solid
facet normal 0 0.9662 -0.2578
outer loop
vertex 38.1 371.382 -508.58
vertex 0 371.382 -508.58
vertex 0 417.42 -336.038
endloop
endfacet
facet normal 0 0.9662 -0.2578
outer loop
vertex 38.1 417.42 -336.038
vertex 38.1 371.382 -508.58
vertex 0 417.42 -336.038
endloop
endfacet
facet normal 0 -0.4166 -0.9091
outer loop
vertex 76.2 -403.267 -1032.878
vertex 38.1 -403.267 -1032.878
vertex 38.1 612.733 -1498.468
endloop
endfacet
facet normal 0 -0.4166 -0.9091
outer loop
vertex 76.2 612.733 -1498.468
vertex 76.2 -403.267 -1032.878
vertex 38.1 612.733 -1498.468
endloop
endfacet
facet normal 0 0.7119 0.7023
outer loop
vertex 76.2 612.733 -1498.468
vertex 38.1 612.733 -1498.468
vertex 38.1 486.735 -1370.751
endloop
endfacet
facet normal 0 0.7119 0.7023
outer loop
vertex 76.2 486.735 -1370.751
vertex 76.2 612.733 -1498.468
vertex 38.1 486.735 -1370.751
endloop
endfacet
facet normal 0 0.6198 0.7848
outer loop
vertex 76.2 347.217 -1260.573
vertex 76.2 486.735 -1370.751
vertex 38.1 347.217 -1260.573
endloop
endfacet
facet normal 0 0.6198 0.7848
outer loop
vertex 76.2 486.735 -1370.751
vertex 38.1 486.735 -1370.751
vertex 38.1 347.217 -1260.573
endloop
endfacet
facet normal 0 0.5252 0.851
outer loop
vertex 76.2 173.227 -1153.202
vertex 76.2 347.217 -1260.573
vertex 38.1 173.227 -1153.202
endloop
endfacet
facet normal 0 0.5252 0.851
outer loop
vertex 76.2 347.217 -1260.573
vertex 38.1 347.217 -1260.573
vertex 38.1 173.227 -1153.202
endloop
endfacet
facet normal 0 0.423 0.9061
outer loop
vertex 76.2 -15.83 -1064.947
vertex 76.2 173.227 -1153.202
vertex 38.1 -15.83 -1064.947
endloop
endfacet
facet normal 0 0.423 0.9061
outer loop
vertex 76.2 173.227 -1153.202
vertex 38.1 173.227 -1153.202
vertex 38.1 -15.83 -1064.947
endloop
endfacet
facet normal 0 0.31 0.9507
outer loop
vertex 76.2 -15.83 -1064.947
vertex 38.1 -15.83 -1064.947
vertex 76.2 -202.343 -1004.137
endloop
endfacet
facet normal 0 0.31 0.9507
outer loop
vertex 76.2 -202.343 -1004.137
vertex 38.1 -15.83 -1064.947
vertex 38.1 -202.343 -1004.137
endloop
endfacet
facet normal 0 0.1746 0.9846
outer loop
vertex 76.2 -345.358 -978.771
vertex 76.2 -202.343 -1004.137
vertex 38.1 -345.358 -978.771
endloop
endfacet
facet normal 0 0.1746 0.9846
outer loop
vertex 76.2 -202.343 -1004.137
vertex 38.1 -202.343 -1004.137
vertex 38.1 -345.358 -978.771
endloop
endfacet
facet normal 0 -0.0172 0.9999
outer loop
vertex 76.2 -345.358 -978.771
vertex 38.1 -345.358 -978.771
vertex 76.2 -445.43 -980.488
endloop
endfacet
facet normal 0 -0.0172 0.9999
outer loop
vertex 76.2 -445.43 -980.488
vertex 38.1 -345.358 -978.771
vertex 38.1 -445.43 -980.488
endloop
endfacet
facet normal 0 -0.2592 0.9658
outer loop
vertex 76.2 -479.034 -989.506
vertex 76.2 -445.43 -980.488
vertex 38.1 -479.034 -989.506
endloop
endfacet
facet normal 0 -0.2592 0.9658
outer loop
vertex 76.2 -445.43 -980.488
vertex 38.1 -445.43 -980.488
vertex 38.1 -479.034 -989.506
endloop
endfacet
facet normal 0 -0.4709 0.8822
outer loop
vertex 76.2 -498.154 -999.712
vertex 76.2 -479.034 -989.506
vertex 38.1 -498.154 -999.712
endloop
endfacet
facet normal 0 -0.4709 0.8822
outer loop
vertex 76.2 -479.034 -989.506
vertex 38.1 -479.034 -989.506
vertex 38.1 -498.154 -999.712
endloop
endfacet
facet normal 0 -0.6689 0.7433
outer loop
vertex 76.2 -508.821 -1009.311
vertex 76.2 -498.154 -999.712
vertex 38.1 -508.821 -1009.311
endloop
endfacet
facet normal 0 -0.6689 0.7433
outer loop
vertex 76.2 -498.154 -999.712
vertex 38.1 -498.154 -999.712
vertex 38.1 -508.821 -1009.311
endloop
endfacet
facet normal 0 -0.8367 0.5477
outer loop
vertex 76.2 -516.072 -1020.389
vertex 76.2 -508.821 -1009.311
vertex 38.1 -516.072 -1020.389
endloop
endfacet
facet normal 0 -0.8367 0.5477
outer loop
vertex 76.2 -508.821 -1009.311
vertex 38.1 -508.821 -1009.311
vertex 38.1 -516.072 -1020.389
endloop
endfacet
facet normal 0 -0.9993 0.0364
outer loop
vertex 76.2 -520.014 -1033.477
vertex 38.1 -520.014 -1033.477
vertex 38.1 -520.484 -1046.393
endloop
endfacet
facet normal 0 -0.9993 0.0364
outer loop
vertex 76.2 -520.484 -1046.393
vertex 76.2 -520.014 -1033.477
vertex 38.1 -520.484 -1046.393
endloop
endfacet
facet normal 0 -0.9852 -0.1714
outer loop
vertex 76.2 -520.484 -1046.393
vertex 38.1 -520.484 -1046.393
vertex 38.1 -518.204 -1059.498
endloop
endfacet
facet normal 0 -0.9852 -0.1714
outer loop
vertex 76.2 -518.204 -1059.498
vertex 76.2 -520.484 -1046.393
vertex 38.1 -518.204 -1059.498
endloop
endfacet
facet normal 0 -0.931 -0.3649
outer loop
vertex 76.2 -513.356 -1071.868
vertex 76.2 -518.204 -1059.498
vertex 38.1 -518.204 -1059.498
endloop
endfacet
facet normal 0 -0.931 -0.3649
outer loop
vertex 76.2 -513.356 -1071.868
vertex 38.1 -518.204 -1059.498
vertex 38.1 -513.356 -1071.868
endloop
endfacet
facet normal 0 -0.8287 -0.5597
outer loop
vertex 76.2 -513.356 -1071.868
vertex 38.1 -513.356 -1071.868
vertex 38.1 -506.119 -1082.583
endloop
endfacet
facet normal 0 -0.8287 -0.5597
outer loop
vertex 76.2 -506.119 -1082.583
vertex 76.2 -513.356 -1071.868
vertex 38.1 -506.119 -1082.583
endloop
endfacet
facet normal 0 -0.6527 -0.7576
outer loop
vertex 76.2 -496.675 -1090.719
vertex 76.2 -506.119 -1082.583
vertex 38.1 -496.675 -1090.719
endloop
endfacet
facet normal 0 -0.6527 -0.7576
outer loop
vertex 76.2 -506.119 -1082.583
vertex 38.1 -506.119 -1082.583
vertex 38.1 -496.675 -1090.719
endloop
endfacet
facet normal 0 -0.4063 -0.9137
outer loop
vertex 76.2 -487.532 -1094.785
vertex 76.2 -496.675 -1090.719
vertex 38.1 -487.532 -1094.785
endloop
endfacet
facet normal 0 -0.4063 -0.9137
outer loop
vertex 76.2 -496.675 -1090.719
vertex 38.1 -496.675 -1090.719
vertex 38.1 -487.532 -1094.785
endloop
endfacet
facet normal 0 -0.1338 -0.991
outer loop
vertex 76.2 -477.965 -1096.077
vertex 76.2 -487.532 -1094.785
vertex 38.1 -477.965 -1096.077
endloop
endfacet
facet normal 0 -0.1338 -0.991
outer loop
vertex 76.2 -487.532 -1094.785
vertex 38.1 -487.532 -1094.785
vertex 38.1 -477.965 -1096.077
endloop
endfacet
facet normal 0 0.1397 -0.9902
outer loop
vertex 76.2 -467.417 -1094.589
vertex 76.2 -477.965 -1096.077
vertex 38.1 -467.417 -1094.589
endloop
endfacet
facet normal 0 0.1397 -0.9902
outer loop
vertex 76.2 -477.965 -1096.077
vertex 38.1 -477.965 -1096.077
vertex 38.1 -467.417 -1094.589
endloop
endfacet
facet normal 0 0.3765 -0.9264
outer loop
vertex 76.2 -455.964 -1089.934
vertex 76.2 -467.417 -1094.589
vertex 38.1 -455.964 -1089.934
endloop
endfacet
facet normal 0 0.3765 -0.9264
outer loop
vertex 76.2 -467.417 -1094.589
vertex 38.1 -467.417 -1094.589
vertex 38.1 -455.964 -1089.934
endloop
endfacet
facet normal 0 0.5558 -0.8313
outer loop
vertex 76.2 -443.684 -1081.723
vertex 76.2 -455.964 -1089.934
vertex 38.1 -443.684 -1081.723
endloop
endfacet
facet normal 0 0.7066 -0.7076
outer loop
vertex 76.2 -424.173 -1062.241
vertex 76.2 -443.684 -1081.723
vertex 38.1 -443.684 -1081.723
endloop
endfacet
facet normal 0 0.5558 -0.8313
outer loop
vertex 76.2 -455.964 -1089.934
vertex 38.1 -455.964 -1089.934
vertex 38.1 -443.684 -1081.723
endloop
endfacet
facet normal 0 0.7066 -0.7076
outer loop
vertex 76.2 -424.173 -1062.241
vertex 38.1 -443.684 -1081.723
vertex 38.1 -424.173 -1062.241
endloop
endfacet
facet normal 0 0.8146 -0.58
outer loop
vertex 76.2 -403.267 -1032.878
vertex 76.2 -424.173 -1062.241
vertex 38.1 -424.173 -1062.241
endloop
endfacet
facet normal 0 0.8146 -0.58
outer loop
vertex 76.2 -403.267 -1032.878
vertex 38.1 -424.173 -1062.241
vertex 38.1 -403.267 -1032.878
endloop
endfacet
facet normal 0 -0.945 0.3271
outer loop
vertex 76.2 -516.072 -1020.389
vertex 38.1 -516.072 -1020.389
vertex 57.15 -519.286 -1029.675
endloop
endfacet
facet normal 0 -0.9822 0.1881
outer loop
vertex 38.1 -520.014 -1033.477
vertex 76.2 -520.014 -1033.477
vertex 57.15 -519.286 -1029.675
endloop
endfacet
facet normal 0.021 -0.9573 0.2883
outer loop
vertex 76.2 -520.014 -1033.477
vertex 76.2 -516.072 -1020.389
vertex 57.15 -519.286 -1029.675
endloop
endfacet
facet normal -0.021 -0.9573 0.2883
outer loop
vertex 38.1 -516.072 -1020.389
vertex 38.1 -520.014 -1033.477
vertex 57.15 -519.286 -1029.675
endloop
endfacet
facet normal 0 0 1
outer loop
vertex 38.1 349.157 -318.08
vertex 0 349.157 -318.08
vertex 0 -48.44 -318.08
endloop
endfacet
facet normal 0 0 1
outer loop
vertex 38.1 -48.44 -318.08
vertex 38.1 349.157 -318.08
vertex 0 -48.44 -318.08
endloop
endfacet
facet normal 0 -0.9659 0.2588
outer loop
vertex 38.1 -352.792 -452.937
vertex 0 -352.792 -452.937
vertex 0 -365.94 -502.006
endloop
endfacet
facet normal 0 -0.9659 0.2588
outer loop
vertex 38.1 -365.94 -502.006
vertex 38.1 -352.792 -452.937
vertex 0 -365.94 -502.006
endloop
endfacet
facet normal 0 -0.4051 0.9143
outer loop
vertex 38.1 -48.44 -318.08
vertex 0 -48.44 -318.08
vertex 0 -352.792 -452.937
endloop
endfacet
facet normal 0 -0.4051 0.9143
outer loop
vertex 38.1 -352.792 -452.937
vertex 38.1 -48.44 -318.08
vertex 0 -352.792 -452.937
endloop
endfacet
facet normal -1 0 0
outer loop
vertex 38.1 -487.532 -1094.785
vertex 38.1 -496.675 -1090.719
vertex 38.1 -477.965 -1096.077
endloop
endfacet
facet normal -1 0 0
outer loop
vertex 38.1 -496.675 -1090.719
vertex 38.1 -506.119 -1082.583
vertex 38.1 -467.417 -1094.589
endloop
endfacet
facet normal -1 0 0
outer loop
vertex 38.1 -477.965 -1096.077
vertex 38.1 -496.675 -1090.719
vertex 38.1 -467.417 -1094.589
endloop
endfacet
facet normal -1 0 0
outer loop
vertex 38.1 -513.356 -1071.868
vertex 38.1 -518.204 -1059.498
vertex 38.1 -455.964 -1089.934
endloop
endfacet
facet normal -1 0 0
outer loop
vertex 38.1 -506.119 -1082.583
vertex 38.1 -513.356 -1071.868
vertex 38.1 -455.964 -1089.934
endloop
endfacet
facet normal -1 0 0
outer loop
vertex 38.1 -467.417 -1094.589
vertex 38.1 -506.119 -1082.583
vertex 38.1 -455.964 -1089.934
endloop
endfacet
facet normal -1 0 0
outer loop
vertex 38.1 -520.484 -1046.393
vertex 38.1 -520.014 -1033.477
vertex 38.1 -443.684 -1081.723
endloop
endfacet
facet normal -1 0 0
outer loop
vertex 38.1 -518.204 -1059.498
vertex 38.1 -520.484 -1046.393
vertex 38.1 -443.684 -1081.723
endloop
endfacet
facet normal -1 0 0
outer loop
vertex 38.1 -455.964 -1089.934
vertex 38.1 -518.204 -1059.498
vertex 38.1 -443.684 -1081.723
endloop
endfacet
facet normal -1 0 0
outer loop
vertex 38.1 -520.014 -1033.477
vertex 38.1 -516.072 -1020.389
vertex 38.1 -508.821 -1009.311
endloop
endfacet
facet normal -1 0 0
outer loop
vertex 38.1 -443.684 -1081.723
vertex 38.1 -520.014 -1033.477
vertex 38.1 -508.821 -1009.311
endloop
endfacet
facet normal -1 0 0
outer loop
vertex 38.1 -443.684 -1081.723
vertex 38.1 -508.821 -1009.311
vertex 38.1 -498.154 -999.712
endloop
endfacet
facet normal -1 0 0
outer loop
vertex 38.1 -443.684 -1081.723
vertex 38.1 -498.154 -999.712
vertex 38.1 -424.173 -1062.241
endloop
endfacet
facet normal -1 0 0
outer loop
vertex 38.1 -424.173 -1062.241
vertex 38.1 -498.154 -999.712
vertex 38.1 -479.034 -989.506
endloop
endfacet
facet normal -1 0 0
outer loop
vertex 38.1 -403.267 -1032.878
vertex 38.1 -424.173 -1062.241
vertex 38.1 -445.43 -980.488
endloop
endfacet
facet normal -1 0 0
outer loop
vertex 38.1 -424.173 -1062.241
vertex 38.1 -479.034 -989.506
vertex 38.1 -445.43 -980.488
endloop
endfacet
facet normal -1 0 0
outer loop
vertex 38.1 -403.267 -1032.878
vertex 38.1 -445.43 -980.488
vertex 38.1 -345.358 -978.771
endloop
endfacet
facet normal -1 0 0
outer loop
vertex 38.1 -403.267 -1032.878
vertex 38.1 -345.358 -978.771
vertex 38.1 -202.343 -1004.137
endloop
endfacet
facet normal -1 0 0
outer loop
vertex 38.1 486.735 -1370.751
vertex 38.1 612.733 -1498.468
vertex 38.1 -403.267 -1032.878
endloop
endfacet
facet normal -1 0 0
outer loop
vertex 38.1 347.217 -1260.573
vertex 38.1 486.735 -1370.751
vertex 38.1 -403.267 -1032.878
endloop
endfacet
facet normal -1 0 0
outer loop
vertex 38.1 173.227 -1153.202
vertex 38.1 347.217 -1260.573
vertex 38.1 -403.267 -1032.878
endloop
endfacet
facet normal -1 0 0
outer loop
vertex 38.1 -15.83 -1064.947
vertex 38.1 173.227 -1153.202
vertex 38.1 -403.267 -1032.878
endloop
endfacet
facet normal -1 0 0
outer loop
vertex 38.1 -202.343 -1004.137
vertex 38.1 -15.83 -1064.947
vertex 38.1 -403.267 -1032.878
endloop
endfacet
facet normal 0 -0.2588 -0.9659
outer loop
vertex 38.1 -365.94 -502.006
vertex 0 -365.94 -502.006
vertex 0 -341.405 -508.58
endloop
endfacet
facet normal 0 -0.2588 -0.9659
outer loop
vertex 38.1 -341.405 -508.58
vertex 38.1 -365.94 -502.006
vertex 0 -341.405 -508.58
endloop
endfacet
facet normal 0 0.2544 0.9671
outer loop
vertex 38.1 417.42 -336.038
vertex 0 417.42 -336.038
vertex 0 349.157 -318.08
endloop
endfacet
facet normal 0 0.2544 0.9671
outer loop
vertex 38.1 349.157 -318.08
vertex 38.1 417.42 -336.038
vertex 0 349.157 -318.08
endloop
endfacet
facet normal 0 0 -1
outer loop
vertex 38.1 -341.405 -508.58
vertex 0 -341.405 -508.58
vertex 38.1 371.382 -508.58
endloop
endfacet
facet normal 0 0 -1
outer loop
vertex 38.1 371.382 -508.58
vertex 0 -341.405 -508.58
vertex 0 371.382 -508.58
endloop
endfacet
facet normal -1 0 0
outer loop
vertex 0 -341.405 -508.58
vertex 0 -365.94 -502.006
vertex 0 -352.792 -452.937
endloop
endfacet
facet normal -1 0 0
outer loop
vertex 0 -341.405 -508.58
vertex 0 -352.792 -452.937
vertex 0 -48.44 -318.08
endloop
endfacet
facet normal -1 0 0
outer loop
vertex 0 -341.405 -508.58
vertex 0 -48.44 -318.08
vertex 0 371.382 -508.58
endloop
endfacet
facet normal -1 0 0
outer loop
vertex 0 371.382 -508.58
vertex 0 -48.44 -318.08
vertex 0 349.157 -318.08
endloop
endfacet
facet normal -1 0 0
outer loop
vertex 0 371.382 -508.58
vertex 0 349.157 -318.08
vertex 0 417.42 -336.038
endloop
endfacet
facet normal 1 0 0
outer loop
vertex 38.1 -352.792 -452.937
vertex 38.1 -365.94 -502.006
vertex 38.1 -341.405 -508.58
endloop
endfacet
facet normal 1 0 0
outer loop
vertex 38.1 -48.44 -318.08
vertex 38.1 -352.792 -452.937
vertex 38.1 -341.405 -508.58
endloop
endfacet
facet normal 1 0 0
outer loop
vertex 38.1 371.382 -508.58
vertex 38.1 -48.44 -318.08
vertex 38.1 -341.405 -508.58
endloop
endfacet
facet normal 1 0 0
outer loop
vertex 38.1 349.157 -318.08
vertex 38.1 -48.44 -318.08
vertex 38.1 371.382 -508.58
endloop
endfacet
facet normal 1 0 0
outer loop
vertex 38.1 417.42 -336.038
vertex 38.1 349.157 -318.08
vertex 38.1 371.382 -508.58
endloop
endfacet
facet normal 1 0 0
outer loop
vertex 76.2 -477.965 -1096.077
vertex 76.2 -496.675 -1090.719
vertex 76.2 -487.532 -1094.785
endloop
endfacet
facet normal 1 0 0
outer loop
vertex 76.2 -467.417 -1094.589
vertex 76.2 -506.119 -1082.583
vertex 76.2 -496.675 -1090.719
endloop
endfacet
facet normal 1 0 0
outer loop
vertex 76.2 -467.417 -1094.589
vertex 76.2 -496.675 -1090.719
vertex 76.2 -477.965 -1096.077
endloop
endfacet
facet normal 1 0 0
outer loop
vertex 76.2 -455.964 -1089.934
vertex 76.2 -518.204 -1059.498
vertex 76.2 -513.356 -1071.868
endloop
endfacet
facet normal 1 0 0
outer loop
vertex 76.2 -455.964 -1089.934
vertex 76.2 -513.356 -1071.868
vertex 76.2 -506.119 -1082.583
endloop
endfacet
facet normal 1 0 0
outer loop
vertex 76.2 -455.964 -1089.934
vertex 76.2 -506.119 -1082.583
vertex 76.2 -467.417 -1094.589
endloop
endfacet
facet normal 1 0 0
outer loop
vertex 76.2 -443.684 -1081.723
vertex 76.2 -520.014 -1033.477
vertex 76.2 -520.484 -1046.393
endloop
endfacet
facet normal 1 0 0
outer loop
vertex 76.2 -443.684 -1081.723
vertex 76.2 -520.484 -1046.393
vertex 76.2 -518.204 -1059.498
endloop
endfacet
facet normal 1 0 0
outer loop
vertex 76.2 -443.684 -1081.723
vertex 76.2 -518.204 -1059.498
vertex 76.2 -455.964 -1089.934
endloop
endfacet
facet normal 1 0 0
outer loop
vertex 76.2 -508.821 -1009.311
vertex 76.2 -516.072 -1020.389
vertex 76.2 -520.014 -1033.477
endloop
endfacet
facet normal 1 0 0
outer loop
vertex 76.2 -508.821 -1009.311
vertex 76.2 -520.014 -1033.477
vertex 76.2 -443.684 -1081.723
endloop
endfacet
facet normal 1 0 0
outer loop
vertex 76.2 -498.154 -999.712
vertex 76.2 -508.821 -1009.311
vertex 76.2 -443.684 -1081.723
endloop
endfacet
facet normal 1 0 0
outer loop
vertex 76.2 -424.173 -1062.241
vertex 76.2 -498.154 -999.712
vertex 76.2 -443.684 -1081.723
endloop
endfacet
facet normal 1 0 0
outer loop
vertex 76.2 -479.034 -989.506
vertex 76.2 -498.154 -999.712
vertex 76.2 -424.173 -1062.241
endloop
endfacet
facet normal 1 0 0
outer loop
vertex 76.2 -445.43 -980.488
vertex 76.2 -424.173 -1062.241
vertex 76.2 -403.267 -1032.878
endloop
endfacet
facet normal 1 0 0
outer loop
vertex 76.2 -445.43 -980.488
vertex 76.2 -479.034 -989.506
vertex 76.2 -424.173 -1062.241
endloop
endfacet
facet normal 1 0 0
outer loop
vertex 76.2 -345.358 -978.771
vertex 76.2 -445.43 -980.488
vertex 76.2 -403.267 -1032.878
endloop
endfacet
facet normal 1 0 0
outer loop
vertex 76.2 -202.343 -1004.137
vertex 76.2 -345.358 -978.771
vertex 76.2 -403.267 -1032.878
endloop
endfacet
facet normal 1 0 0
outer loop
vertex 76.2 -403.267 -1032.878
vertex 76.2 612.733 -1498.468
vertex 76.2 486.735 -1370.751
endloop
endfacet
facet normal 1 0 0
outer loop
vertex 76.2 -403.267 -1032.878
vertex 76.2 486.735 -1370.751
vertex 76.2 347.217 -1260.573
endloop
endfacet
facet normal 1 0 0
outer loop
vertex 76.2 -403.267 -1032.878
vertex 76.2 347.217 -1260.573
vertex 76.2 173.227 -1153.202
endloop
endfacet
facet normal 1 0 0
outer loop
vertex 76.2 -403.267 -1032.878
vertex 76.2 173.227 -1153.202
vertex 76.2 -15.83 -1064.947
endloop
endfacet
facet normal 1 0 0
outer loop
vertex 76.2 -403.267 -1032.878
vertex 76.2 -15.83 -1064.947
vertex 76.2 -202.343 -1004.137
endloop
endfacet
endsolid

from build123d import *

# Parameters (mm, degrees)
F1_DEPTH = 38.1
F4_DEPTH = 38.1


with BuildPart() as f1:
    # F0 (on Right) → F1 (new body)
    with BuildSketch(Plane.YZ):
        Polygon((-365.9396546841, -502.0062856797), (-341.4051386963, -508.5802894253), (371.3823613037, -508.5802894253), (417.4198613037, -336.0380894253), (349.1573613037, -318.0802894253), (-48.4396546841, -318.0802894253), (-352.7916471929, -452.9372537042), align=None)
    extrude(amount=F1_DEPTH)


with BuildPart() as f4:
    # F3 (on face) → F4 (new body)
    with BuildSketch(Plane.YZ.offset(38.1)):
        with BuildLine():
            Line((-403.2669318563, -1032.8784938841), (612.7330681437, -1498.4681844916))
            add(Edge.make_bspline(
                [(612.7330681437, -1498.4681844916), (225.1875507799, -1047.3338939783), (-703.1732463559, -829.5169255484), (-476.6149520874, -1151.2105684895), (-403.2669318563, -1032.8784938841)],
                knots=[0, 0, 0, 0, 0.7646566969, 1, 1, 1, 1], degree=3))
        make_face()
    extrude(amount=F4_DEPTH)


solid = Compound([f1.part, f4.part])
